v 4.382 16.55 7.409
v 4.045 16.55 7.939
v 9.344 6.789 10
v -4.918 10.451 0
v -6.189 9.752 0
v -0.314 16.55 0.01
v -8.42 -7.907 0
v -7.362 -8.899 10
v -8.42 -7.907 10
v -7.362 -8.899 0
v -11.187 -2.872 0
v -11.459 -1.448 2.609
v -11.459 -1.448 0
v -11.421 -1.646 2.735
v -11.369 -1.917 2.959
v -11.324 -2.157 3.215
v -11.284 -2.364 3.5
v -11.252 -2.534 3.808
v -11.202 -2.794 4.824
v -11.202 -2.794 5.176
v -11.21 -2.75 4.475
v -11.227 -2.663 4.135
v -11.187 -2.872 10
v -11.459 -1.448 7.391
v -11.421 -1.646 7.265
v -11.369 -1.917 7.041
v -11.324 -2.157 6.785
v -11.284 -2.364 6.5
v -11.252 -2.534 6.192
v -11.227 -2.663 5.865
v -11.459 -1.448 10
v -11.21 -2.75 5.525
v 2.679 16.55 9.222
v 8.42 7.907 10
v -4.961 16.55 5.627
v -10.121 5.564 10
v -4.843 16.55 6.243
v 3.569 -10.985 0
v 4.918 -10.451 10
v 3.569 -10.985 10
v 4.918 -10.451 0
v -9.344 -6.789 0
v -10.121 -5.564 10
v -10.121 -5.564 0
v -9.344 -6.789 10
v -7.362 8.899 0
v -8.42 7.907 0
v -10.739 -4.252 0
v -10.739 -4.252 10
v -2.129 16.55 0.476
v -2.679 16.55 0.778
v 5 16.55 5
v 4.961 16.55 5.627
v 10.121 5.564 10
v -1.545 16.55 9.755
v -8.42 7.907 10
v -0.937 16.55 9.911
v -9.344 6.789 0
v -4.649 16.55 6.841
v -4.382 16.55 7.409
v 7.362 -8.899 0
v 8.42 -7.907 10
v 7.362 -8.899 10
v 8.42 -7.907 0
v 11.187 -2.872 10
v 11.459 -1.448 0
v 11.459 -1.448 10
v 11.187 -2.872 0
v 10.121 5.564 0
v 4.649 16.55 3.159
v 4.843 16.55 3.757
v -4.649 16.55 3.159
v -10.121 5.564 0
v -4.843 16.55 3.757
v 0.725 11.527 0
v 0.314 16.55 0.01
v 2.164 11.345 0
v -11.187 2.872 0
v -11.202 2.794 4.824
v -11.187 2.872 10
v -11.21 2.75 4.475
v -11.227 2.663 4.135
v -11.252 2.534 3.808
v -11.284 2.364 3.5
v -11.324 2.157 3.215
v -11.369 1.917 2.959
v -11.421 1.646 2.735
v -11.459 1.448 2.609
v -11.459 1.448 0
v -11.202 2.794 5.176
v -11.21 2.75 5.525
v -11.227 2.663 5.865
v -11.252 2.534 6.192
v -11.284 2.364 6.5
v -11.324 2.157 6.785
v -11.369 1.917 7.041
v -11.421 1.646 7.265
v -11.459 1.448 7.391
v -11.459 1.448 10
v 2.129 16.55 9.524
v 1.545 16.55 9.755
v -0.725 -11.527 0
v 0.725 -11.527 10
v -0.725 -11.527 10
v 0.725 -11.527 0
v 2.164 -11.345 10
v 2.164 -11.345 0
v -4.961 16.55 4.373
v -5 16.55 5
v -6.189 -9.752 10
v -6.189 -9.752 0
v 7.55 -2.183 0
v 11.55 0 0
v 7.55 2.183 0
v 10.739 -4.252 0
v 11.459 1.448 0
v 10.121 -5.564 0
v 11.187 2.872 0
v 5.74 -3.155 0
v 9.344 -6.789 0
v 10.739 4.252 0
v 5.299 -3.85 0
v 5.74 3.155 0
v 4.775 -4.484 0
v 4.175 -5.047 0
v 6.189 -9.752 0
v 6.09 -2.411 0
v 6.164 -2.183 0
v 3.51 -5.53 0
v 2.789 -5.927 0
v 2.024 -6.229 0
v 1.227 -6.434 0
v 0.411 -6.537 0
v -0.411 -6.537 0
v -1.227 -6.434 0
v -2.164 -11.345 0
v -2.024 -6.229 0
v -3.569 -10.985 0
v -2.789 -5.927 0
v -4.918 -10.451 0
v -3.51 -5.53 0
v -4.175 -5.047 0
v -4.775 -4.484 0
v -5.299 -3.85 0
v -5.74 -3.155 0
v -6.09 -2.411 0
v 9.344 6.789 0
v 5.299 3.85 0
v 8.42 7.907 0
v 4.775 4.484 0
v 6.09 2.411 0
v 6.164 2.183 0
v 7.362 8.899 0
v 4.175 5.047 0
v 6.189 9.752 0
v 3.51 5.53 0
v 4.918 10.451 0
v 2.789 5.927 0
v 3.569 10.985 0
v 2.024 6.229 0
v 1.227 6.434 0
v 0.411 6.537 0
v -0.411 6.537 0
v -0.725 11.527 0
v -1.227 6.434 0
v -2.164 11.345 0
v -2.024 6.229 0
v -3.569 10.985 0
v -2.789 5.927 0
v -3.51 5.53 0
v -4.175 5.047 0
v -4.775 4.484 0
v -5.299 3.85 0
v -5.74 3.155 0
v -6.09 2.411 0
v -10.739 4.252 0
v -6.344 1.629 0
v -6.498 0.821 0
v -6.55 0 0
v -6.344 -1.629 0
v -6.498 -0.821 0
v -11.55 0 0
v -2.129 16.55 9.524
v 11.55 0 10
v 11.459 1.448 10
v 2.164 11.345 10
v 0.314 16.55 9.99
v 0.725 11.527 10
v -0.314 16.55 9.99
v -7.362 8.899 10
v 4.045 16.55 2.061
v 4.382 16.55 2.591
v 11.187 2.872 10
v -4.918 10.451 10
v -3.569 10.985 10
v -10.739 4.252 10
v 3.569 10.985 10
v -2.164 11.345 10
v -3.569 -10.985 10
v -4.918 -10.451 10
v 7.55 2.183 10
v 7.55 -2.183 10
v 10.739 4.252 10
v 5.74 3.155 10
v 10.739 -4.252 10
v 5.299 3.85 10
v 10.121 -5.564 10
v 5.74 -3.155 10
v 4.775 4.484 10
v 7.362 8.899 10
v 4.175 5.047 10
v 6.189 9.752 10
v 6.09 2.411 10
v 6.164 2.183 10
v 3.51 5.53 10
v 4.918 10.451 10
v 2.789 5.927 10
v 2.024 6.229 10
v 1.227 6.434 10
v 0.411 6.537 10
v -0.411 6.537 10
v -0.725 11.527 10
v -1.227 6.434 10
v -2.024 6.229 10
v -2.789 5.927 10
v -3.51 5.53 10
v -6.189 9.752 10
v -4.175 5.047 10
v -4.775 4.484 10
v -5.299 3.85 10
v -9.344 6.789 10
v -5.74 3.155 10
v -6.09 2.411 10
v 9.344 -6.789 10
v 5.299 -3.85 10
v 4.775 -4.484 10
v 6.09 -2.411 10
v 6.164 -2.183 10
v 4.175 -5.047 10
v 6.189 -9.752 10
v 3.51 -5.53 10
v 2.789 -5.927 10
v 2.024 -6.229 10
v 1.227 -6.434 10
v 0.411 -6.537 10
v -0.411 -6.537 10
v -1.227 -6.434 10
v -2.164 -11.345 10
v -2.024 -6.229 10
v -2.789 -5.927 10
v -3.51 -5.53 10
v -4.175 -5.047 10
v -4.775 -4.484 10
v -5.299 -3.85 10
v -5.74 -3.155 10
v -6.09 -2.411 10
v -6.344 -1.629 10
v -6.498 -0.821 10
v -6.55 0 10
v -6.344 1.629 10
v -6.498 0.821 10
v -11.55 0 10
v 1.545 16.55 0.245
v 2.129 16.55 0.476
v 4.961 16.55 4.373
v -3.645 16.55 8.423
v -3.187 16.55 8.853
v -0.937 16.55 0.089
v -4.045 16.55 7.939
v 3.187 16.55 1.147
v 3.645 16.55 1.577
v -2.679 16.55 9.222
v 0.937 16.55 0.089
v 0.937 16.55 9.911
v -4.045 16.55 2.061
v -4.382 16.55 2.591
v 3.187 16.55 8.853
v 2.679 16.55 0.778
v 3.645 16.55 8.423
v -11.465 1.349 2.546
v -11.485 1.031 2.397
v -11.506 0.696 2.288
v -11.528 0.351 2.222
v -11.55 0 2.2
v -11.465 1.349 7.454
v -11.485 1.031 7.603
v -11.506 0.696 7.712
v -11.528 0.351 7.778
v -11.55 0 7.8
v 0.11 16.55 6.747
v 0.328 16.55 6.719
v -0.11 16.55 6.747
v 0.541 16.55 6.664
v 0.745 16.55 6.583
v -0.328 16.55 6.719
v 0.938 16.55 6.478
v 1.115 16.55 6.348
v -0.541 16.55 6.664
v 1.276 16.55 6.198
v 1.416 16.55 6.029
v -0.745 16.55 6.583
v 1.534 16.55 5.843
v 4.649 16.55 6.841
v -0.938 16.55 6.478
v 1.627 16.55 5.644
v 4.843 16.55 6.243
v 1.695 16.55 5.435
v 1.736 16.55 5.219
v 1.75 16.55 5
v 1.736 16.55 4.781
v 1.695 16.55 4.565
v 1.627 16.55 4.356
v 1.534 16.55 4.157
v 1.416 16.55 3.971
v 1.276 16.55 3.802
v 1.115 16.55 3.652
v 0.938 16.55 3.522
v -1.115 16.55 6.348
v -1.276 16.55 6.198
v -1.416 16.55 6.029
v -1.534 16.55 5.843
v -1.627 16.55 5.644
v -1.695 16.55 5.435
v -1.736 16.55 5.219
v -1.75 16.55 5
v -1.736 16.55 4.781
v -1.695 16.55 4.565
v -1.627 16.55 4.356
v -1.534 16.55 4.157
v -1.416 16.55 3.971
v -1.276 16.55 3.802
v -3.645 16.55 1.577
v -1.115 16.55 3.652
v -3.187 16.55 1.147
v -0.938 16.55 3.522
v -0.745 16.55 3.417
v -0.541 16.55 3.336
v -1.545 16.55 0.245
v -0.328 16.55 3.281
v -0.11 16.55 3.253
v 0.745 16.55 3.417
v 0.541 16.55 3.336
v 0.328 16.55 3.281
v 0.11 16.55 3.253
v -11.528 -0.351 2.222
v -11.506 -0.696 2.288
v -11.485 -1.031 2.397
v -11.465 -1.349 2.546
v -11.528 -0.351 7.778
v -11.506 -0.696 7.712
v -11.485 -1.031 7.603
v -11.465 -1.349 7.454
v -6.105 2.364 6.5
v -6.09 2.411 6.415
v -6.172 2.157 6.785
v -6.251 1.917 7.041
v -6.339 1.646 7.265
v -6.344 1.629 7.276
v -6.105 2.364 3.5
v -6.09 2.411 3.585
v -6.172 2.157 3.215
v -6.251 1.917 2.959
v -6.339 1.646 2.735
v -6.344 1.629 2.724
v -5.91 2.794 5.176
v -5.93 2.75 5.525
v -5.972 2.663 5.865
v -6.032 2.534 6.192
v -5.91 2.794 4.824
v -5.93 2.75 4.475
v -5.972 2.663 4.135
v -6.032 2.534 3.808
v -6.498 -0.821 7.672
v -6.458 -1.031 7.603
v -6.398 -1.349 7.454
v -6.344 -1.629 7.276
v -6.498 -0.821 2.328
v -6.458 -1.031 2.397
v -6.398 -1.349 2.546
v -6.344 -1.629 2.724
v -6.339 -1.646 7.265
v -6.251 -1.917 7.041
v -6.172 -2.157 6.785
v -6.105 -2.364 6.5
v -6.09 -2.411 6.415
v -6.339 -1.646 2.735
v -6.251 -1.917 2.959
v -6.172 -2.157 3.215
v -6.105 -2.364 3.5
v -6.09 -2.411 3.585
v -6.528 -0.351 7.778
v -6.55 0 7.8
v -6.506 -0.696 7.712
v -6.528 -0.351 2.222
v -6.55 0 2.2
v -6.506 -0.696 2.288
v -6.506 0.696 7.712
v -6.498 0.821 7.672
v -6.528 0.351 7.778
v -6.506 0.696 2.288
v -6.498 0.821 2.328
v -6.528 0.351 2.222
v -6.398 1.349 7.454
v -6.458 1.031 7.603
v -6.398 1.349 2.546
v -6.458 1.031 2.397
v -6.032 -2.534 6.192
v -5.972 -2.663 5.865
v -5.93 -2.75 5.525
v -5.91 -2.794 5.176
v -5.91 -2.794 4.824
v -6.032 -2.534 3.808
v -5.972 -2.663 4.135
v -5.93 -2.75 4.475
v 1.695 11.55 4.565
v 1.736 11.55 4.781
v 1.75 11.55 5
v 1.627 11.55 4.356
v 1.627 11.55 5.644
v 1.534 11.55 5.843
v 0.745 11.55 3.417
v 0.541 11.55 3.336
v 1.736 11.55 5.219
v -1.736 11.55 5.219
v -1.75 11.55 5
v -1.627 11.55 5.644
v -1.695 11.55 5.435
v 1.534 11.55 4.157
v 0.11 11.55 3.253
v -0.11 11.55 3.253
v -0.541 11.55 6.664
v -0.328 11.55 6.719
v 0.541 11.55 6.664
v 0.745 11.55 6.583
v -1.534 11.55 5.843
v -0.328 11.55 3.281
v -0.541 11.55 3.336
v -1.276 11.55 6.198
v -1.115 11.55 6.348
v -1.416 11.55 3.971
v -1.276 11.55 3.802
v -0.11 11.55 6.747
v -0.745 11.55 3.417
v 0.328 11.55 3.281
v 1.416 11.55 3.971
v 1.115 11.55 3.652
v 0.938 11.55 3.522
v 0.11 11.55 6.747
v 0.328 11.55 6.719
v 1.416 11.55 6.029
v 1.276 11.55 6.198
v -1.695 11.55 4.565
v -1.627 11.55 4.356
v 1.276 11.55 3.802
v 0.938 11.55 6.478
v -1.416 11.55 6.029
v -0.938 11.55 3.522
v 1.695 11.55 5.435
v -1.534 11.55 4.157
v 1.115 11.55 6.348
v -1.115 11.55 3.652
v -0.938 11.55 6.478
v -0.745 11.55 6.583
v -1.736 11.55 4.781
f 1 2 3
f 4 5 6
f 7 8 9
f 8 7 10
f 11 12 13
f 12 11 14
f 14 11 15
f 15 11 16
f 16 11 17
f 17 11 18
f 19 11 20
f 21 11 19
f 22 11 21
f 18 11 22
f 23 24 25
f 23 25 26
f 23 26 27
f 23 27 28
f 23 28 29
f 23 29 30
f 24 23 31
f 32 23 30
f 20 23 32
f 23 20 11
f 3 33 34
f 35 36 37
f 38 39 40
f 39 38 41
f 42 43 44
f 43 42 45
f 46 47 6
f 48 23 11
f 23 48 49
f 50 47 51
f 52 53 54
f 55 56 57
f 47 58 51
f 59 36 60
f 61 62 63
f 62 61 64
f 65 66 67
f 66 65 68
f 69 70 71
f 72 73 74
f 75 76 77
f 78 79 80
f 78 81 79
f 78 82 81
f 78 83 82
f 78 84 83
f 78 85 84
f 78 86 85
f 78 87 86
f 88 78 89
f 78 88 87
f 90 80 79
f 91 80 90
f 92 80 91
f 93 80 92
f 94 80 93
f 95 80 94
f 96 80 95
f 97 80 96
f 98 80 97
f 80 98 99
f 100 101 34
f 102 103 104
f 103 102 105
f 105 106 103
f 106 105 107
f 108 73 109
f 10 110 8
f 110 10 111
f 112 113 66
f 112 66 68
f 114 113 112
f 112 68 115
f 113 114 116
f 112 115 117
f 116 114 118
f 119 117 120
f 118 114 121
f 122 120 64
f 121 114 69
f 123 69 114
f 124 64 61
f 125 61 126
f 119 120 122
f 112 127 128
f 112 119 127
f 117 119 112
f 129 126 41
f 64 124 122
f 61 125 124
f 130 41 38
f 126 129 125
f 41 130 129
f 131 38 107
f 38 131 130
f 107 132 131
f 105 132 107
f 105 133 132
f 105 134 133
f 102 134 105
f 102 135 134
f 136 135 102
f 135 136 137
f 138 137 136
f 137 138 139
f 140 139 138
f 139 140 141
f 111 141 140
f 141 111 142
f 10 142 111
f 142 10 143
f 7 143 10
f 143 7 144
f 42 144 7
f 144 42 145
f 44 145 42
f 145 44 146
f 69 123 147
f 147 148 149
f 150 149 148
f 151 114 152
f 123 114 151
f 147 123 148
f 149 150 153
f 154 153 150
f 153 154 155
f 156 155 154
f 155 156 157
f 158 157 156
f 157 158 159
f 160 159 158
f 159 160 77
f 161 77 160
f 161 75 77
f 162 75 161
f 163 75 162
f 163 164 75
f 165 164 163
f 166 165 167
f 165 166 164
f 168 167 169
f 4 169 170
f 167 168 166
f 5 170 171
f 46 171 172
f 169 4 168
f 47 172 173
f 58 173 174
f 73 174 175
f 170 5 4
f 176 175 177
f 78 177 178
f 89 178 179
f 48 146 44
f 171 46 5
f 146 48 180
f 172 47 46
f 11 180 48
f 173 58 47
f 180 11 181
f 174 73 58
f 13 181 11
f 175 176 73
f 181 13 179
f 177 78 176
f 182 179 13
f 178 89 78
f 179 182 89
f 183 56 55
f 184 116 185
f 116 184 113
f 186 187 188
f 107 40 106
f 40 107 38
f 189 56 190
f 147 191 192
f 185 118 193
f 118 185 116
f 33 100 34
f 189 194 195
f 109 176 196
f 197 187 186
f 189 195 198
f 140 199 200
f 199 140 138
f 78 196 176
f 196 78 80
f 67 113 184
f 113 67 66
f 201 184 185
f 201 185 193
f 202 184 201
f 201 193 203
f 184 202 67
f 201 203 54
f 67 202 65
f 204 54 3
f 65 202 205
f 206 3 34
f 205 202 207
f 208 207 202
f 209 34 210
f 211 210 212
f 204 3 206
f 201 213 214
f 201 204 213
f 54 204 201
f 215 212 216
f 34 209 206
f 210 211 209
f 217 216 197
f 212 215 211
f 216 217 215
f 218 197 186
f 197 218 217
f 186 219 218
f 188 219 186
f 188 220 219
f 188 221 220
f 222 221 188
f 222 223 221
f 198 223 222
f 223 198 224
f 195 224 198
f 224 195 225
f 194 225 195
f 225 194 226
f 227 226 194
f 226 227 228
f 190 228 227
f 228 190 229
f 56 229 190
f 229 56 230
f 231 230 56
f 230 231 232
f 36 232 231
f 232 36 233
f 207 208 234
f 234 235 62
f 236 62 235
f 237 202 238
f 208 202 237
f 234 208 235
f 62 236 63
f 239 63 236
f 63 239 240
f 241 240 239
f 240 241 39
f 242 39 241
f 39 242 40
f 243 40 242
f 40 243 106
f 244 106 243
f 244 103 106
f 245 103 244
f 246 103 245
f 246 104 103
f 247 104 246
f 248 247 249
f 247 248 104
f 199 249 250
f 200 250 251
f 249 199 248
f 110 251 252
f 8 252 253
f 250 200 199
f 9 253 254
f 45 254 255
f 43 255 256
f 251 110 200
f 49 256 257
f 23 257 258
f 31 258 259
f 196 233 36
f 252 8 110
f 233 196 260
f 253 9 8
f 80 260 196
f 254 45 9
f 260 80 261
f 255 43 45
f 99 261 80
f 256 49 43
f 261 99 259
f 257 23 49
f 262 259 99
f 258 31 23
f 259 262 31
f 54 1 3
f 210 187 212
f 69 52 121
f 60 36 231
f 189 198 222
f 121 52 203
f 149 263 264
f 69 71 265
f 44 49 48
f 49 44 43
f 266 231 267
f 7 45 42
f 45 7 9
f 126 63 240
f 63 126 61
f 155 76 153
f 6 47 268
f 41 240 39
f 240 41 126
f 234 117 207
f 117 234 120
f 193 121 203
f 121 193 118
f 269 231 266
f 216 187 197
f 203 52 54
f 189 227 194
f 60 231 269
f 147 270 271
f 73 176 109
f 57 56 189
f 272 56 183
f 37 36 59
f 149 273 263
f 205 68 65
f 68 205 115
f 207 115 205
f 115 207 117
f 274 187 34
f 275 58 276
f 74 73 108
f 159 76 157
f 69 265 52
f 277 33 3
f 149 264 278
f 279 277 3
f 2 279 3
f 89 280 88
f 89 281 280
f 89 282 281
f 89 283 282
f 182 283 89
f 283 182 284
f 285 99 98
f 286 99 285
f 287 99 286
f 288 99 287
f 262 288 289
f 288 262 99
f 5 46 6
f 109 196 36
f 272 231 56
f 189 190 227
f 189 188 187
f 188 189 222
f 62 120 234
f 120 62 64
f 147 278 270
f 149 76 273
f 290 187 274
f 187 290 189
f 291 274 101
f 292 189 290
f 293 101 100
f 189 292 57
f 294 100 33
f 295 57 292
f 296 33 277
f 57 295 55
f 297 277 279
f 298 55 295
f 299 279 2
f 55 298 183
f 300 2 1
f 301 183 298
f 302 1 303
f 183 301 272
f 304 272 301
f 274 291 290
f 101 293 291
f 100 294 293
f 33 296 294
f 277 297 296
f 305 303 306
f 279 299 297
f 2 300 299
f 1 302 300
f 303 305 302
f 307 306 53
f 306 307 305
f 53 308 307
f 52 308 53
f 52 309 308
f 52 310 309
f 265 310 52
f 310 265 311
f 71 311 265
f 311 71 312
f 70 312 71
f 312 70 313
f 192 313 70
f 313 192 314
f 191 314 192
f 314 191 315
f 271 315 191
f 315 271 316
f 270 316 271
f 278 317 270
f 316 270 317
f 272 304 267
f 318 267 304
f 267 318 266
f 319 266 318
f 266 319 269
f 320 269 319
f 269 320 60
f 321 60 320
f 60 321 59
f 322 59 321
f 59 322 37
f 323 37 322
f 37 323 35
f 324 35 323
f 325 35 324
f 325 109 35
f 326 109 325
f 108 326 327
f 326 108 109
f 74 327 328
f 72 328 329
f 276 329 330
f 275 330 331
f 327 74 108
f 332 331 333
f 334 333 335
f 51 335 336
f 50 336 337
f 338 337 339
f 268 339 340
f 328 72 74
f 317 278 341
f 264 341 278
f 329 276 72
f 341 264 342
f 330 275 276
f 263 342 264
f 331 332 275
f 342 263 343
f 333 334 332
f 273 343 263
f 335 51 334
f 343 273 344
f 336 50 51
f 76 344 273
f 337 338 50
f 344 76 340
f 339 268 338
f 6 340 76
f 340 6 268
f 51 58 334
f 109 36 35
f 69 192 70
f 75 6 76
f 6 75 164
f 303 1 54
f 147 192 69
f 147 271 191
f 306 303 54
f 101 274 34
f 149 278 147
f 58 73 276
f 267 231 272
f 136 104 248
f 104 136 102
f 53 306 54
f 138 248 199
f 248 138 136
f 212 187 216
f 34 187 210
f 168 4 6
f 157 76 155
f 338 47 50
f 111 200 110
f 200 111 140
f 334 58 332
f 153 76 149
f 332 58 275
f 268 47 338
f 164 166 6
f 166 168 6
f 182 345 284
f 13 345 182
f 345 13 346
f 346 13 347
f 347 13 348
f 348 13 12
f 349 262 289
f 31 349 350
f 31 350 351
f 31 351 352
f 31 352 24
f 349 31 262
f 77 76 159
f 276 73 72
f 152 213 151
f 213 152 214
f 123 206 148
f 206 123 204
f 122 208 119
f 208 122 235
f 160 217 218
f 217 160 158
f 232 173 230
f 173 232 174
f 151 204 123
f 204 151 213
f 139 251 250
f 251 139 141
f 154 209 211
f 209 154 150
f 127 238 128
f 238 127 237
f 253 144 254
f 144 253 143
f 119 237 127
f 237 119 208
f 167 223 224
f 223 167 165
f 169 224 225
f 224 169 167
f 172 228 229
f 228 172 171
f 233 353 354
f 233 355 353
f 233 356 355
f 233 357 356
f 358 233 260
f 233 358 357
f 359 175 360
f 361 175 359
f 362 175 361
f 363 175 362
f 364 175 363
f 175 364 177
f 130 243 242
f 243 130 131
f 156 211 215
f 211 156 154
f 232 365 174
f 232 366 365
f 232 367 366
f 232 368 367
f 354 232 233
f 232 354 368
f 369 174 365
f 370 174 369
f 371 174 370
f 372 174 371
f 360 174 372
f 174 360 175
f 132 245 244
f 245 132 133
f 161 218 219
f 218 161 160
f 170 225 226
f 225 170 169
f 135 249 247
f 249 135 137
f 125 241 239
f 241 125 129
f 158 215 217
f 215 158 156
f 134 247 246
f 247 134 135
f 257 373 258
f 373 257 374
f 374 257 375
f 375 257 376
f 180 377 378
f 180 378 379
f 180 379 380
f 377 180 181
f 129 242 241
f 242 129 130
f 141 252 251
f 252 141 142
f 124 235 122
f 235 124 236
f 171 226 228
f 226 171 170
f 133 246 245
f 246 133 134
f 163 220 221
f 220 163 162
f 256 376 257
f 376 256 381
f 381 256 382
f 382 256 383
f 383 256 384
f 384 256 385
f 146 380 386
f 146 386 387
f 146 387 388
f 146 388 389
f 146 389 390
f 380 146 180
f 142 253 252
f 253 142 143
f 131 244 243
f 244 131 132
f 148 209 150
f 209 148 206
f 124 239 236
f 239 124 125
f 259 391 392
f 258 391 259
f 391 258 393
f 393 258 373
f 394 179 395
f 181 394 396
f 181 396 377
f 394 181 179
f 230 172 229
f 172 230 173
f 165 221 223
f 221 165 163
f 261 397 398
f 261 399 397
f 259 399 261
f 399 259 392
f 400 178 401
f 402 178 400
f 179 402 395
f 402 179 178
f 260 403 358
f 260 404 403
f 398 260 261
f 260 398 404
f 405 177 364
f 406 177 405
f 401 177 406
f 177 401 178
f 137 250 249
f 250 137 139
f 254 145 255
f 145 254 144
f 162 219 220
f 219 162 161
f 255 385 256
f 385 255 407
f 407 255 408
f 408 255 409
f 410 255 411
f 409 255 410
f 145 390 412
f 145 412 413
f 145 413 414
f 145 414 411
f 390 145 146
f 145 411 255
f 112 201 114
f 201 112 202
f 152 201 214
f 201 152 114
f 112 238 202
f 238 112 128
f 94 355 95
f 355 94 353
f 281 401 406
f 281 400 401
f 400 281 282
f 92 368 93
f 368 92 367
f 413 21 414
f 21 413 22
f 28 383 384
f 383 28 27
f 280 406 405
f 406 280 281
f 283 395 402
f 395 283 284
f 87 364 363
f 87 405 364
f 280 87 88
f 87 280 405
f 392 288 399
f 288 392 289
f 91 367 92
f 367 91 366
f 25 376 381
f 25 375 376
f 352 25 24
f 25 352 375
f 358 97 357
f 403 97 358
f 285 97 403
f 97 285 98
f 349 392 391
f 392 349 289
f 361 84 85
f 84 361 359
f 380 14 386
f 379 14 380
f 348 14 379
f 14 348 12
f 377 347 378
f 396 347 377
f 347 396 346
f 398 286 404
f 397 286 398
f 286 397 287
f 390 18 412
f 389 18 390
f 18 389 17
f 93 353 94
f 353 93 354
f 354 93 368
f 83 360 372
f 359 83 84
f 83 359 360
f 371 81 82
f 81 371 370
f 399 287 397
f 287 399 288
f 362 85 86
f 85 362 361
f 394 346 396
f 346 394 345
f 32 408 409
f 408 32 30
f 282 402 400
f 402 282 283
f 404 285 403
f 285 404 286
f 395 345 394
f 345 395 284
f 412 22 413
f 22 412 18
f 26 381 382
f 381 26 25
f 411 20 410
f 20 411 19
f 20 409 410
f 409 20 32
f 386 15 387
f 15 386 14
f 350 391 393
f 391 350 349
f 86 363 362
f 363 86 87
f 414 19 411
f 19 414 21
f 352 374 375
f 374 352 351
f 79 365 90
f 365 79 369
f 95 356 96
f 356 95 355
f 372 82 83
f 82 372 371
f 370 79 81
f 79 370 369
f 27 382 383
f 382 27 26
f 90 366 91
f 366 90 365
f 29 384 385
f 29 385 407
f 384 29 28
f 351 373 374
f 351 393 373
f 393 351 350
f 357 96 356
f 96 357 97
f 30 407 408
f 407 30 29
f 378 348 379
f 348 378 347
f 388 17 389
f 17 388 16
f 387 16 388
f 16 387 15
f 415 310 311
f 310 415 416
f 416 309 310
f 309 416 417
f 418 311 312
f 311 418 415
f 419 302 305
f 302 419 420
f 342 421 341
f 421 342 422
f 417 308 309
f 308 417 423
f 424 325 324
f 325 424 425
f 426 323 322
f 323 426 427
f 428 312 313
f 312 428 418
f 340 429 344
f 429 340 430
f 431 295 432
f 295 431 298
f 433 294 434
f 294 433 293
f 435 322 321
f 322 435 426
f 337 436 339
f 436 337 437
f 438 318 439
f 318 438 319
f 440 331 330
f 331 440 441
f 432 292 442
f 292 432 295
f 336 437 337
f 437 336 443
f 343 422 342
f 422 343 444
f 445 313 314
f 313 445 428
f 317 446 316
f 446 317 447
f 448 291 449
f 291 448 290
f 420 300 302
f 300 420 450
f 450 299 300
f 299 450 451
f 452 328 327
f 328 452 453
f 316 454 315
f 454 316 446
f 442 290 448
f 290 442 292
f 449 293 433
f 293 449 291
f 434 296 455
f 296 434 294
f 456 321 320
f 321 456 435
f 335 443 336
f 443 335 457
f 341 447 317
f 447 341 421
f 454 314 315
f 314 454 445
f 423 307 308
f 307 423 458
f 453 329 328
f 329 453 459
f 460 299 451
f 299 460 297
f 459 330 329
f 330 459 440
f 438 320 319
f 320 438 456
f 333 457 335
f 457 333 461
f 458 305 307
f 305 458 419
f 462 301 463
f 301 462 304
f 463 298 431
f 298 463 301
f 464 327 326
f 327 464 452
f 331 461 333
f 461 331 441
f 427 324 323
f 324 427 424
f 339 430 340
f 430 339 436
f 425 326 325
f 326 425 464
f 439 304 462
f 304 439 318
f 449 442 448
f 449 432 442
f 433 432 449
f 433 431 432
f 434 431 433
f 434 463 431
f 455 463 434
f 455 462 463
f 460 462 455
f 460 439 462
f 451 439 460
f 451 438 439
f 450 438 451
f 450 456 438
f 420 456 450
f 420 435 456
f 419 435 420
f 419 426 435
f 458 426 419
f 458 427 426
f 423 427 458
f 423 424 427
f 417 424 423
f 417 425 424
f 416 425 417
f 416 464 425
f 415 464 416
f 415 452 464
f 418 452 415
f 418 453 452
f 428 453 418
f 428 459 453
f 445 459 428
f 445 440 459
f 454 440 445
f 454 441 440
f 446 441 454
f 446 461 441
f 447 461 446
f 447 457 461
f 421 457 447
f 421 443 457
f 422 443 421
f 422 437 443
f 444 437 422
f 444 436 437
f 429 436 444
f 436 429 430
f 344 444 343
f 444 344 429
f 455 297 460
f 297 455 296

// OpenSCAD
//design and code by emanresu (http://www.thingiverse.com/Emanresu)


// preview[view:north west]

//CUSTOMIZER VARIABLES


//post clamp parameters

//What diameter of post will you be clamping?
post_diameter = 13.1;
//How thick do you want the walls of the clamp?
clamp_wall_thick = 5;
//tap hole for clamp retention screw
clamp_screw_diameter = 5.6;


//mount base parameters

//how deep do you want the mount screw hole? 
mount_depth = 5;
//how big around is the top of the post you will be attaching the clamp to?
mount_diameter = 10;
//tap hole for mounting screw, what kind of screw is the post you will attach the clamp to tapped for?
mount_screw_diameter = 3.5;


/* [Hidden] */

//sets the depth/height of the clamp section to be the diameter of the mount base
clamp_height = mount_diameter;

  /////////////
 // Modules //
/////////////


module post_clamp_90() {
	// Generates a 90º post coupling which will screw into the end of one post 
	// and clamp around another oriented perpendicular to the first
	difference() {
		hull() {
			//generates basic shape, a hull of two perpendicular cylinders
			
			//the first cylinder will be "drilled" to fit around a post
			cylinder(r=post_diameter/2+clamp_wall_thick, h=clamp_height, $fn=50, center=true);
			translate([0, post_diameter/2+clamp_wall_thick+mount_depth/2, 0]) {
				//base of clamp that will be "drilled" and tapped
				rotate([90, 0, 0]) {
					cylinder(r=mount_diameter/2, mount_depth, $fn=50,center=true);
				}
			}
		}
		cylinder(r=post_diameter/2, h=clamp_height+1, $fn=50, center=true); //hole for post
		translate([post_diameter/4+clamp_wall_thick/5, 0, 0]) {//generates clamping notch in post hole
			rotate([0, 0, 0]) {
				cube(size=[post_diameter/2, post_diameter/3, clamp_height+1], center=true);//clamping notch
			}
		}
		translate([-(post_diameter/2+clamp_wall_thick+1)/2, 0, 0]) {//clamp screw hole
			rotate([0, 90, 0]) {
				cylinder(r=clamp_screw_diameter/2, h=post_diameter/2+clamp_wall_thick+1, $fn=50, center=true);
			}
		}
		translate([0, post_diameter/2+clamp_wall_thick, 0]) {//mount screw hole
			rotate([-90, 0, 0]) {
				cylinder(r=mount_screw_diameter/2, h=mount_depth+1, $fn=50, center=false);

			}
		}
	}	
}



  //////////////////
 // Control Code //
//////////////////

translate([0, 0, clamp_height/2]) {
	post_clamp_90();
}
